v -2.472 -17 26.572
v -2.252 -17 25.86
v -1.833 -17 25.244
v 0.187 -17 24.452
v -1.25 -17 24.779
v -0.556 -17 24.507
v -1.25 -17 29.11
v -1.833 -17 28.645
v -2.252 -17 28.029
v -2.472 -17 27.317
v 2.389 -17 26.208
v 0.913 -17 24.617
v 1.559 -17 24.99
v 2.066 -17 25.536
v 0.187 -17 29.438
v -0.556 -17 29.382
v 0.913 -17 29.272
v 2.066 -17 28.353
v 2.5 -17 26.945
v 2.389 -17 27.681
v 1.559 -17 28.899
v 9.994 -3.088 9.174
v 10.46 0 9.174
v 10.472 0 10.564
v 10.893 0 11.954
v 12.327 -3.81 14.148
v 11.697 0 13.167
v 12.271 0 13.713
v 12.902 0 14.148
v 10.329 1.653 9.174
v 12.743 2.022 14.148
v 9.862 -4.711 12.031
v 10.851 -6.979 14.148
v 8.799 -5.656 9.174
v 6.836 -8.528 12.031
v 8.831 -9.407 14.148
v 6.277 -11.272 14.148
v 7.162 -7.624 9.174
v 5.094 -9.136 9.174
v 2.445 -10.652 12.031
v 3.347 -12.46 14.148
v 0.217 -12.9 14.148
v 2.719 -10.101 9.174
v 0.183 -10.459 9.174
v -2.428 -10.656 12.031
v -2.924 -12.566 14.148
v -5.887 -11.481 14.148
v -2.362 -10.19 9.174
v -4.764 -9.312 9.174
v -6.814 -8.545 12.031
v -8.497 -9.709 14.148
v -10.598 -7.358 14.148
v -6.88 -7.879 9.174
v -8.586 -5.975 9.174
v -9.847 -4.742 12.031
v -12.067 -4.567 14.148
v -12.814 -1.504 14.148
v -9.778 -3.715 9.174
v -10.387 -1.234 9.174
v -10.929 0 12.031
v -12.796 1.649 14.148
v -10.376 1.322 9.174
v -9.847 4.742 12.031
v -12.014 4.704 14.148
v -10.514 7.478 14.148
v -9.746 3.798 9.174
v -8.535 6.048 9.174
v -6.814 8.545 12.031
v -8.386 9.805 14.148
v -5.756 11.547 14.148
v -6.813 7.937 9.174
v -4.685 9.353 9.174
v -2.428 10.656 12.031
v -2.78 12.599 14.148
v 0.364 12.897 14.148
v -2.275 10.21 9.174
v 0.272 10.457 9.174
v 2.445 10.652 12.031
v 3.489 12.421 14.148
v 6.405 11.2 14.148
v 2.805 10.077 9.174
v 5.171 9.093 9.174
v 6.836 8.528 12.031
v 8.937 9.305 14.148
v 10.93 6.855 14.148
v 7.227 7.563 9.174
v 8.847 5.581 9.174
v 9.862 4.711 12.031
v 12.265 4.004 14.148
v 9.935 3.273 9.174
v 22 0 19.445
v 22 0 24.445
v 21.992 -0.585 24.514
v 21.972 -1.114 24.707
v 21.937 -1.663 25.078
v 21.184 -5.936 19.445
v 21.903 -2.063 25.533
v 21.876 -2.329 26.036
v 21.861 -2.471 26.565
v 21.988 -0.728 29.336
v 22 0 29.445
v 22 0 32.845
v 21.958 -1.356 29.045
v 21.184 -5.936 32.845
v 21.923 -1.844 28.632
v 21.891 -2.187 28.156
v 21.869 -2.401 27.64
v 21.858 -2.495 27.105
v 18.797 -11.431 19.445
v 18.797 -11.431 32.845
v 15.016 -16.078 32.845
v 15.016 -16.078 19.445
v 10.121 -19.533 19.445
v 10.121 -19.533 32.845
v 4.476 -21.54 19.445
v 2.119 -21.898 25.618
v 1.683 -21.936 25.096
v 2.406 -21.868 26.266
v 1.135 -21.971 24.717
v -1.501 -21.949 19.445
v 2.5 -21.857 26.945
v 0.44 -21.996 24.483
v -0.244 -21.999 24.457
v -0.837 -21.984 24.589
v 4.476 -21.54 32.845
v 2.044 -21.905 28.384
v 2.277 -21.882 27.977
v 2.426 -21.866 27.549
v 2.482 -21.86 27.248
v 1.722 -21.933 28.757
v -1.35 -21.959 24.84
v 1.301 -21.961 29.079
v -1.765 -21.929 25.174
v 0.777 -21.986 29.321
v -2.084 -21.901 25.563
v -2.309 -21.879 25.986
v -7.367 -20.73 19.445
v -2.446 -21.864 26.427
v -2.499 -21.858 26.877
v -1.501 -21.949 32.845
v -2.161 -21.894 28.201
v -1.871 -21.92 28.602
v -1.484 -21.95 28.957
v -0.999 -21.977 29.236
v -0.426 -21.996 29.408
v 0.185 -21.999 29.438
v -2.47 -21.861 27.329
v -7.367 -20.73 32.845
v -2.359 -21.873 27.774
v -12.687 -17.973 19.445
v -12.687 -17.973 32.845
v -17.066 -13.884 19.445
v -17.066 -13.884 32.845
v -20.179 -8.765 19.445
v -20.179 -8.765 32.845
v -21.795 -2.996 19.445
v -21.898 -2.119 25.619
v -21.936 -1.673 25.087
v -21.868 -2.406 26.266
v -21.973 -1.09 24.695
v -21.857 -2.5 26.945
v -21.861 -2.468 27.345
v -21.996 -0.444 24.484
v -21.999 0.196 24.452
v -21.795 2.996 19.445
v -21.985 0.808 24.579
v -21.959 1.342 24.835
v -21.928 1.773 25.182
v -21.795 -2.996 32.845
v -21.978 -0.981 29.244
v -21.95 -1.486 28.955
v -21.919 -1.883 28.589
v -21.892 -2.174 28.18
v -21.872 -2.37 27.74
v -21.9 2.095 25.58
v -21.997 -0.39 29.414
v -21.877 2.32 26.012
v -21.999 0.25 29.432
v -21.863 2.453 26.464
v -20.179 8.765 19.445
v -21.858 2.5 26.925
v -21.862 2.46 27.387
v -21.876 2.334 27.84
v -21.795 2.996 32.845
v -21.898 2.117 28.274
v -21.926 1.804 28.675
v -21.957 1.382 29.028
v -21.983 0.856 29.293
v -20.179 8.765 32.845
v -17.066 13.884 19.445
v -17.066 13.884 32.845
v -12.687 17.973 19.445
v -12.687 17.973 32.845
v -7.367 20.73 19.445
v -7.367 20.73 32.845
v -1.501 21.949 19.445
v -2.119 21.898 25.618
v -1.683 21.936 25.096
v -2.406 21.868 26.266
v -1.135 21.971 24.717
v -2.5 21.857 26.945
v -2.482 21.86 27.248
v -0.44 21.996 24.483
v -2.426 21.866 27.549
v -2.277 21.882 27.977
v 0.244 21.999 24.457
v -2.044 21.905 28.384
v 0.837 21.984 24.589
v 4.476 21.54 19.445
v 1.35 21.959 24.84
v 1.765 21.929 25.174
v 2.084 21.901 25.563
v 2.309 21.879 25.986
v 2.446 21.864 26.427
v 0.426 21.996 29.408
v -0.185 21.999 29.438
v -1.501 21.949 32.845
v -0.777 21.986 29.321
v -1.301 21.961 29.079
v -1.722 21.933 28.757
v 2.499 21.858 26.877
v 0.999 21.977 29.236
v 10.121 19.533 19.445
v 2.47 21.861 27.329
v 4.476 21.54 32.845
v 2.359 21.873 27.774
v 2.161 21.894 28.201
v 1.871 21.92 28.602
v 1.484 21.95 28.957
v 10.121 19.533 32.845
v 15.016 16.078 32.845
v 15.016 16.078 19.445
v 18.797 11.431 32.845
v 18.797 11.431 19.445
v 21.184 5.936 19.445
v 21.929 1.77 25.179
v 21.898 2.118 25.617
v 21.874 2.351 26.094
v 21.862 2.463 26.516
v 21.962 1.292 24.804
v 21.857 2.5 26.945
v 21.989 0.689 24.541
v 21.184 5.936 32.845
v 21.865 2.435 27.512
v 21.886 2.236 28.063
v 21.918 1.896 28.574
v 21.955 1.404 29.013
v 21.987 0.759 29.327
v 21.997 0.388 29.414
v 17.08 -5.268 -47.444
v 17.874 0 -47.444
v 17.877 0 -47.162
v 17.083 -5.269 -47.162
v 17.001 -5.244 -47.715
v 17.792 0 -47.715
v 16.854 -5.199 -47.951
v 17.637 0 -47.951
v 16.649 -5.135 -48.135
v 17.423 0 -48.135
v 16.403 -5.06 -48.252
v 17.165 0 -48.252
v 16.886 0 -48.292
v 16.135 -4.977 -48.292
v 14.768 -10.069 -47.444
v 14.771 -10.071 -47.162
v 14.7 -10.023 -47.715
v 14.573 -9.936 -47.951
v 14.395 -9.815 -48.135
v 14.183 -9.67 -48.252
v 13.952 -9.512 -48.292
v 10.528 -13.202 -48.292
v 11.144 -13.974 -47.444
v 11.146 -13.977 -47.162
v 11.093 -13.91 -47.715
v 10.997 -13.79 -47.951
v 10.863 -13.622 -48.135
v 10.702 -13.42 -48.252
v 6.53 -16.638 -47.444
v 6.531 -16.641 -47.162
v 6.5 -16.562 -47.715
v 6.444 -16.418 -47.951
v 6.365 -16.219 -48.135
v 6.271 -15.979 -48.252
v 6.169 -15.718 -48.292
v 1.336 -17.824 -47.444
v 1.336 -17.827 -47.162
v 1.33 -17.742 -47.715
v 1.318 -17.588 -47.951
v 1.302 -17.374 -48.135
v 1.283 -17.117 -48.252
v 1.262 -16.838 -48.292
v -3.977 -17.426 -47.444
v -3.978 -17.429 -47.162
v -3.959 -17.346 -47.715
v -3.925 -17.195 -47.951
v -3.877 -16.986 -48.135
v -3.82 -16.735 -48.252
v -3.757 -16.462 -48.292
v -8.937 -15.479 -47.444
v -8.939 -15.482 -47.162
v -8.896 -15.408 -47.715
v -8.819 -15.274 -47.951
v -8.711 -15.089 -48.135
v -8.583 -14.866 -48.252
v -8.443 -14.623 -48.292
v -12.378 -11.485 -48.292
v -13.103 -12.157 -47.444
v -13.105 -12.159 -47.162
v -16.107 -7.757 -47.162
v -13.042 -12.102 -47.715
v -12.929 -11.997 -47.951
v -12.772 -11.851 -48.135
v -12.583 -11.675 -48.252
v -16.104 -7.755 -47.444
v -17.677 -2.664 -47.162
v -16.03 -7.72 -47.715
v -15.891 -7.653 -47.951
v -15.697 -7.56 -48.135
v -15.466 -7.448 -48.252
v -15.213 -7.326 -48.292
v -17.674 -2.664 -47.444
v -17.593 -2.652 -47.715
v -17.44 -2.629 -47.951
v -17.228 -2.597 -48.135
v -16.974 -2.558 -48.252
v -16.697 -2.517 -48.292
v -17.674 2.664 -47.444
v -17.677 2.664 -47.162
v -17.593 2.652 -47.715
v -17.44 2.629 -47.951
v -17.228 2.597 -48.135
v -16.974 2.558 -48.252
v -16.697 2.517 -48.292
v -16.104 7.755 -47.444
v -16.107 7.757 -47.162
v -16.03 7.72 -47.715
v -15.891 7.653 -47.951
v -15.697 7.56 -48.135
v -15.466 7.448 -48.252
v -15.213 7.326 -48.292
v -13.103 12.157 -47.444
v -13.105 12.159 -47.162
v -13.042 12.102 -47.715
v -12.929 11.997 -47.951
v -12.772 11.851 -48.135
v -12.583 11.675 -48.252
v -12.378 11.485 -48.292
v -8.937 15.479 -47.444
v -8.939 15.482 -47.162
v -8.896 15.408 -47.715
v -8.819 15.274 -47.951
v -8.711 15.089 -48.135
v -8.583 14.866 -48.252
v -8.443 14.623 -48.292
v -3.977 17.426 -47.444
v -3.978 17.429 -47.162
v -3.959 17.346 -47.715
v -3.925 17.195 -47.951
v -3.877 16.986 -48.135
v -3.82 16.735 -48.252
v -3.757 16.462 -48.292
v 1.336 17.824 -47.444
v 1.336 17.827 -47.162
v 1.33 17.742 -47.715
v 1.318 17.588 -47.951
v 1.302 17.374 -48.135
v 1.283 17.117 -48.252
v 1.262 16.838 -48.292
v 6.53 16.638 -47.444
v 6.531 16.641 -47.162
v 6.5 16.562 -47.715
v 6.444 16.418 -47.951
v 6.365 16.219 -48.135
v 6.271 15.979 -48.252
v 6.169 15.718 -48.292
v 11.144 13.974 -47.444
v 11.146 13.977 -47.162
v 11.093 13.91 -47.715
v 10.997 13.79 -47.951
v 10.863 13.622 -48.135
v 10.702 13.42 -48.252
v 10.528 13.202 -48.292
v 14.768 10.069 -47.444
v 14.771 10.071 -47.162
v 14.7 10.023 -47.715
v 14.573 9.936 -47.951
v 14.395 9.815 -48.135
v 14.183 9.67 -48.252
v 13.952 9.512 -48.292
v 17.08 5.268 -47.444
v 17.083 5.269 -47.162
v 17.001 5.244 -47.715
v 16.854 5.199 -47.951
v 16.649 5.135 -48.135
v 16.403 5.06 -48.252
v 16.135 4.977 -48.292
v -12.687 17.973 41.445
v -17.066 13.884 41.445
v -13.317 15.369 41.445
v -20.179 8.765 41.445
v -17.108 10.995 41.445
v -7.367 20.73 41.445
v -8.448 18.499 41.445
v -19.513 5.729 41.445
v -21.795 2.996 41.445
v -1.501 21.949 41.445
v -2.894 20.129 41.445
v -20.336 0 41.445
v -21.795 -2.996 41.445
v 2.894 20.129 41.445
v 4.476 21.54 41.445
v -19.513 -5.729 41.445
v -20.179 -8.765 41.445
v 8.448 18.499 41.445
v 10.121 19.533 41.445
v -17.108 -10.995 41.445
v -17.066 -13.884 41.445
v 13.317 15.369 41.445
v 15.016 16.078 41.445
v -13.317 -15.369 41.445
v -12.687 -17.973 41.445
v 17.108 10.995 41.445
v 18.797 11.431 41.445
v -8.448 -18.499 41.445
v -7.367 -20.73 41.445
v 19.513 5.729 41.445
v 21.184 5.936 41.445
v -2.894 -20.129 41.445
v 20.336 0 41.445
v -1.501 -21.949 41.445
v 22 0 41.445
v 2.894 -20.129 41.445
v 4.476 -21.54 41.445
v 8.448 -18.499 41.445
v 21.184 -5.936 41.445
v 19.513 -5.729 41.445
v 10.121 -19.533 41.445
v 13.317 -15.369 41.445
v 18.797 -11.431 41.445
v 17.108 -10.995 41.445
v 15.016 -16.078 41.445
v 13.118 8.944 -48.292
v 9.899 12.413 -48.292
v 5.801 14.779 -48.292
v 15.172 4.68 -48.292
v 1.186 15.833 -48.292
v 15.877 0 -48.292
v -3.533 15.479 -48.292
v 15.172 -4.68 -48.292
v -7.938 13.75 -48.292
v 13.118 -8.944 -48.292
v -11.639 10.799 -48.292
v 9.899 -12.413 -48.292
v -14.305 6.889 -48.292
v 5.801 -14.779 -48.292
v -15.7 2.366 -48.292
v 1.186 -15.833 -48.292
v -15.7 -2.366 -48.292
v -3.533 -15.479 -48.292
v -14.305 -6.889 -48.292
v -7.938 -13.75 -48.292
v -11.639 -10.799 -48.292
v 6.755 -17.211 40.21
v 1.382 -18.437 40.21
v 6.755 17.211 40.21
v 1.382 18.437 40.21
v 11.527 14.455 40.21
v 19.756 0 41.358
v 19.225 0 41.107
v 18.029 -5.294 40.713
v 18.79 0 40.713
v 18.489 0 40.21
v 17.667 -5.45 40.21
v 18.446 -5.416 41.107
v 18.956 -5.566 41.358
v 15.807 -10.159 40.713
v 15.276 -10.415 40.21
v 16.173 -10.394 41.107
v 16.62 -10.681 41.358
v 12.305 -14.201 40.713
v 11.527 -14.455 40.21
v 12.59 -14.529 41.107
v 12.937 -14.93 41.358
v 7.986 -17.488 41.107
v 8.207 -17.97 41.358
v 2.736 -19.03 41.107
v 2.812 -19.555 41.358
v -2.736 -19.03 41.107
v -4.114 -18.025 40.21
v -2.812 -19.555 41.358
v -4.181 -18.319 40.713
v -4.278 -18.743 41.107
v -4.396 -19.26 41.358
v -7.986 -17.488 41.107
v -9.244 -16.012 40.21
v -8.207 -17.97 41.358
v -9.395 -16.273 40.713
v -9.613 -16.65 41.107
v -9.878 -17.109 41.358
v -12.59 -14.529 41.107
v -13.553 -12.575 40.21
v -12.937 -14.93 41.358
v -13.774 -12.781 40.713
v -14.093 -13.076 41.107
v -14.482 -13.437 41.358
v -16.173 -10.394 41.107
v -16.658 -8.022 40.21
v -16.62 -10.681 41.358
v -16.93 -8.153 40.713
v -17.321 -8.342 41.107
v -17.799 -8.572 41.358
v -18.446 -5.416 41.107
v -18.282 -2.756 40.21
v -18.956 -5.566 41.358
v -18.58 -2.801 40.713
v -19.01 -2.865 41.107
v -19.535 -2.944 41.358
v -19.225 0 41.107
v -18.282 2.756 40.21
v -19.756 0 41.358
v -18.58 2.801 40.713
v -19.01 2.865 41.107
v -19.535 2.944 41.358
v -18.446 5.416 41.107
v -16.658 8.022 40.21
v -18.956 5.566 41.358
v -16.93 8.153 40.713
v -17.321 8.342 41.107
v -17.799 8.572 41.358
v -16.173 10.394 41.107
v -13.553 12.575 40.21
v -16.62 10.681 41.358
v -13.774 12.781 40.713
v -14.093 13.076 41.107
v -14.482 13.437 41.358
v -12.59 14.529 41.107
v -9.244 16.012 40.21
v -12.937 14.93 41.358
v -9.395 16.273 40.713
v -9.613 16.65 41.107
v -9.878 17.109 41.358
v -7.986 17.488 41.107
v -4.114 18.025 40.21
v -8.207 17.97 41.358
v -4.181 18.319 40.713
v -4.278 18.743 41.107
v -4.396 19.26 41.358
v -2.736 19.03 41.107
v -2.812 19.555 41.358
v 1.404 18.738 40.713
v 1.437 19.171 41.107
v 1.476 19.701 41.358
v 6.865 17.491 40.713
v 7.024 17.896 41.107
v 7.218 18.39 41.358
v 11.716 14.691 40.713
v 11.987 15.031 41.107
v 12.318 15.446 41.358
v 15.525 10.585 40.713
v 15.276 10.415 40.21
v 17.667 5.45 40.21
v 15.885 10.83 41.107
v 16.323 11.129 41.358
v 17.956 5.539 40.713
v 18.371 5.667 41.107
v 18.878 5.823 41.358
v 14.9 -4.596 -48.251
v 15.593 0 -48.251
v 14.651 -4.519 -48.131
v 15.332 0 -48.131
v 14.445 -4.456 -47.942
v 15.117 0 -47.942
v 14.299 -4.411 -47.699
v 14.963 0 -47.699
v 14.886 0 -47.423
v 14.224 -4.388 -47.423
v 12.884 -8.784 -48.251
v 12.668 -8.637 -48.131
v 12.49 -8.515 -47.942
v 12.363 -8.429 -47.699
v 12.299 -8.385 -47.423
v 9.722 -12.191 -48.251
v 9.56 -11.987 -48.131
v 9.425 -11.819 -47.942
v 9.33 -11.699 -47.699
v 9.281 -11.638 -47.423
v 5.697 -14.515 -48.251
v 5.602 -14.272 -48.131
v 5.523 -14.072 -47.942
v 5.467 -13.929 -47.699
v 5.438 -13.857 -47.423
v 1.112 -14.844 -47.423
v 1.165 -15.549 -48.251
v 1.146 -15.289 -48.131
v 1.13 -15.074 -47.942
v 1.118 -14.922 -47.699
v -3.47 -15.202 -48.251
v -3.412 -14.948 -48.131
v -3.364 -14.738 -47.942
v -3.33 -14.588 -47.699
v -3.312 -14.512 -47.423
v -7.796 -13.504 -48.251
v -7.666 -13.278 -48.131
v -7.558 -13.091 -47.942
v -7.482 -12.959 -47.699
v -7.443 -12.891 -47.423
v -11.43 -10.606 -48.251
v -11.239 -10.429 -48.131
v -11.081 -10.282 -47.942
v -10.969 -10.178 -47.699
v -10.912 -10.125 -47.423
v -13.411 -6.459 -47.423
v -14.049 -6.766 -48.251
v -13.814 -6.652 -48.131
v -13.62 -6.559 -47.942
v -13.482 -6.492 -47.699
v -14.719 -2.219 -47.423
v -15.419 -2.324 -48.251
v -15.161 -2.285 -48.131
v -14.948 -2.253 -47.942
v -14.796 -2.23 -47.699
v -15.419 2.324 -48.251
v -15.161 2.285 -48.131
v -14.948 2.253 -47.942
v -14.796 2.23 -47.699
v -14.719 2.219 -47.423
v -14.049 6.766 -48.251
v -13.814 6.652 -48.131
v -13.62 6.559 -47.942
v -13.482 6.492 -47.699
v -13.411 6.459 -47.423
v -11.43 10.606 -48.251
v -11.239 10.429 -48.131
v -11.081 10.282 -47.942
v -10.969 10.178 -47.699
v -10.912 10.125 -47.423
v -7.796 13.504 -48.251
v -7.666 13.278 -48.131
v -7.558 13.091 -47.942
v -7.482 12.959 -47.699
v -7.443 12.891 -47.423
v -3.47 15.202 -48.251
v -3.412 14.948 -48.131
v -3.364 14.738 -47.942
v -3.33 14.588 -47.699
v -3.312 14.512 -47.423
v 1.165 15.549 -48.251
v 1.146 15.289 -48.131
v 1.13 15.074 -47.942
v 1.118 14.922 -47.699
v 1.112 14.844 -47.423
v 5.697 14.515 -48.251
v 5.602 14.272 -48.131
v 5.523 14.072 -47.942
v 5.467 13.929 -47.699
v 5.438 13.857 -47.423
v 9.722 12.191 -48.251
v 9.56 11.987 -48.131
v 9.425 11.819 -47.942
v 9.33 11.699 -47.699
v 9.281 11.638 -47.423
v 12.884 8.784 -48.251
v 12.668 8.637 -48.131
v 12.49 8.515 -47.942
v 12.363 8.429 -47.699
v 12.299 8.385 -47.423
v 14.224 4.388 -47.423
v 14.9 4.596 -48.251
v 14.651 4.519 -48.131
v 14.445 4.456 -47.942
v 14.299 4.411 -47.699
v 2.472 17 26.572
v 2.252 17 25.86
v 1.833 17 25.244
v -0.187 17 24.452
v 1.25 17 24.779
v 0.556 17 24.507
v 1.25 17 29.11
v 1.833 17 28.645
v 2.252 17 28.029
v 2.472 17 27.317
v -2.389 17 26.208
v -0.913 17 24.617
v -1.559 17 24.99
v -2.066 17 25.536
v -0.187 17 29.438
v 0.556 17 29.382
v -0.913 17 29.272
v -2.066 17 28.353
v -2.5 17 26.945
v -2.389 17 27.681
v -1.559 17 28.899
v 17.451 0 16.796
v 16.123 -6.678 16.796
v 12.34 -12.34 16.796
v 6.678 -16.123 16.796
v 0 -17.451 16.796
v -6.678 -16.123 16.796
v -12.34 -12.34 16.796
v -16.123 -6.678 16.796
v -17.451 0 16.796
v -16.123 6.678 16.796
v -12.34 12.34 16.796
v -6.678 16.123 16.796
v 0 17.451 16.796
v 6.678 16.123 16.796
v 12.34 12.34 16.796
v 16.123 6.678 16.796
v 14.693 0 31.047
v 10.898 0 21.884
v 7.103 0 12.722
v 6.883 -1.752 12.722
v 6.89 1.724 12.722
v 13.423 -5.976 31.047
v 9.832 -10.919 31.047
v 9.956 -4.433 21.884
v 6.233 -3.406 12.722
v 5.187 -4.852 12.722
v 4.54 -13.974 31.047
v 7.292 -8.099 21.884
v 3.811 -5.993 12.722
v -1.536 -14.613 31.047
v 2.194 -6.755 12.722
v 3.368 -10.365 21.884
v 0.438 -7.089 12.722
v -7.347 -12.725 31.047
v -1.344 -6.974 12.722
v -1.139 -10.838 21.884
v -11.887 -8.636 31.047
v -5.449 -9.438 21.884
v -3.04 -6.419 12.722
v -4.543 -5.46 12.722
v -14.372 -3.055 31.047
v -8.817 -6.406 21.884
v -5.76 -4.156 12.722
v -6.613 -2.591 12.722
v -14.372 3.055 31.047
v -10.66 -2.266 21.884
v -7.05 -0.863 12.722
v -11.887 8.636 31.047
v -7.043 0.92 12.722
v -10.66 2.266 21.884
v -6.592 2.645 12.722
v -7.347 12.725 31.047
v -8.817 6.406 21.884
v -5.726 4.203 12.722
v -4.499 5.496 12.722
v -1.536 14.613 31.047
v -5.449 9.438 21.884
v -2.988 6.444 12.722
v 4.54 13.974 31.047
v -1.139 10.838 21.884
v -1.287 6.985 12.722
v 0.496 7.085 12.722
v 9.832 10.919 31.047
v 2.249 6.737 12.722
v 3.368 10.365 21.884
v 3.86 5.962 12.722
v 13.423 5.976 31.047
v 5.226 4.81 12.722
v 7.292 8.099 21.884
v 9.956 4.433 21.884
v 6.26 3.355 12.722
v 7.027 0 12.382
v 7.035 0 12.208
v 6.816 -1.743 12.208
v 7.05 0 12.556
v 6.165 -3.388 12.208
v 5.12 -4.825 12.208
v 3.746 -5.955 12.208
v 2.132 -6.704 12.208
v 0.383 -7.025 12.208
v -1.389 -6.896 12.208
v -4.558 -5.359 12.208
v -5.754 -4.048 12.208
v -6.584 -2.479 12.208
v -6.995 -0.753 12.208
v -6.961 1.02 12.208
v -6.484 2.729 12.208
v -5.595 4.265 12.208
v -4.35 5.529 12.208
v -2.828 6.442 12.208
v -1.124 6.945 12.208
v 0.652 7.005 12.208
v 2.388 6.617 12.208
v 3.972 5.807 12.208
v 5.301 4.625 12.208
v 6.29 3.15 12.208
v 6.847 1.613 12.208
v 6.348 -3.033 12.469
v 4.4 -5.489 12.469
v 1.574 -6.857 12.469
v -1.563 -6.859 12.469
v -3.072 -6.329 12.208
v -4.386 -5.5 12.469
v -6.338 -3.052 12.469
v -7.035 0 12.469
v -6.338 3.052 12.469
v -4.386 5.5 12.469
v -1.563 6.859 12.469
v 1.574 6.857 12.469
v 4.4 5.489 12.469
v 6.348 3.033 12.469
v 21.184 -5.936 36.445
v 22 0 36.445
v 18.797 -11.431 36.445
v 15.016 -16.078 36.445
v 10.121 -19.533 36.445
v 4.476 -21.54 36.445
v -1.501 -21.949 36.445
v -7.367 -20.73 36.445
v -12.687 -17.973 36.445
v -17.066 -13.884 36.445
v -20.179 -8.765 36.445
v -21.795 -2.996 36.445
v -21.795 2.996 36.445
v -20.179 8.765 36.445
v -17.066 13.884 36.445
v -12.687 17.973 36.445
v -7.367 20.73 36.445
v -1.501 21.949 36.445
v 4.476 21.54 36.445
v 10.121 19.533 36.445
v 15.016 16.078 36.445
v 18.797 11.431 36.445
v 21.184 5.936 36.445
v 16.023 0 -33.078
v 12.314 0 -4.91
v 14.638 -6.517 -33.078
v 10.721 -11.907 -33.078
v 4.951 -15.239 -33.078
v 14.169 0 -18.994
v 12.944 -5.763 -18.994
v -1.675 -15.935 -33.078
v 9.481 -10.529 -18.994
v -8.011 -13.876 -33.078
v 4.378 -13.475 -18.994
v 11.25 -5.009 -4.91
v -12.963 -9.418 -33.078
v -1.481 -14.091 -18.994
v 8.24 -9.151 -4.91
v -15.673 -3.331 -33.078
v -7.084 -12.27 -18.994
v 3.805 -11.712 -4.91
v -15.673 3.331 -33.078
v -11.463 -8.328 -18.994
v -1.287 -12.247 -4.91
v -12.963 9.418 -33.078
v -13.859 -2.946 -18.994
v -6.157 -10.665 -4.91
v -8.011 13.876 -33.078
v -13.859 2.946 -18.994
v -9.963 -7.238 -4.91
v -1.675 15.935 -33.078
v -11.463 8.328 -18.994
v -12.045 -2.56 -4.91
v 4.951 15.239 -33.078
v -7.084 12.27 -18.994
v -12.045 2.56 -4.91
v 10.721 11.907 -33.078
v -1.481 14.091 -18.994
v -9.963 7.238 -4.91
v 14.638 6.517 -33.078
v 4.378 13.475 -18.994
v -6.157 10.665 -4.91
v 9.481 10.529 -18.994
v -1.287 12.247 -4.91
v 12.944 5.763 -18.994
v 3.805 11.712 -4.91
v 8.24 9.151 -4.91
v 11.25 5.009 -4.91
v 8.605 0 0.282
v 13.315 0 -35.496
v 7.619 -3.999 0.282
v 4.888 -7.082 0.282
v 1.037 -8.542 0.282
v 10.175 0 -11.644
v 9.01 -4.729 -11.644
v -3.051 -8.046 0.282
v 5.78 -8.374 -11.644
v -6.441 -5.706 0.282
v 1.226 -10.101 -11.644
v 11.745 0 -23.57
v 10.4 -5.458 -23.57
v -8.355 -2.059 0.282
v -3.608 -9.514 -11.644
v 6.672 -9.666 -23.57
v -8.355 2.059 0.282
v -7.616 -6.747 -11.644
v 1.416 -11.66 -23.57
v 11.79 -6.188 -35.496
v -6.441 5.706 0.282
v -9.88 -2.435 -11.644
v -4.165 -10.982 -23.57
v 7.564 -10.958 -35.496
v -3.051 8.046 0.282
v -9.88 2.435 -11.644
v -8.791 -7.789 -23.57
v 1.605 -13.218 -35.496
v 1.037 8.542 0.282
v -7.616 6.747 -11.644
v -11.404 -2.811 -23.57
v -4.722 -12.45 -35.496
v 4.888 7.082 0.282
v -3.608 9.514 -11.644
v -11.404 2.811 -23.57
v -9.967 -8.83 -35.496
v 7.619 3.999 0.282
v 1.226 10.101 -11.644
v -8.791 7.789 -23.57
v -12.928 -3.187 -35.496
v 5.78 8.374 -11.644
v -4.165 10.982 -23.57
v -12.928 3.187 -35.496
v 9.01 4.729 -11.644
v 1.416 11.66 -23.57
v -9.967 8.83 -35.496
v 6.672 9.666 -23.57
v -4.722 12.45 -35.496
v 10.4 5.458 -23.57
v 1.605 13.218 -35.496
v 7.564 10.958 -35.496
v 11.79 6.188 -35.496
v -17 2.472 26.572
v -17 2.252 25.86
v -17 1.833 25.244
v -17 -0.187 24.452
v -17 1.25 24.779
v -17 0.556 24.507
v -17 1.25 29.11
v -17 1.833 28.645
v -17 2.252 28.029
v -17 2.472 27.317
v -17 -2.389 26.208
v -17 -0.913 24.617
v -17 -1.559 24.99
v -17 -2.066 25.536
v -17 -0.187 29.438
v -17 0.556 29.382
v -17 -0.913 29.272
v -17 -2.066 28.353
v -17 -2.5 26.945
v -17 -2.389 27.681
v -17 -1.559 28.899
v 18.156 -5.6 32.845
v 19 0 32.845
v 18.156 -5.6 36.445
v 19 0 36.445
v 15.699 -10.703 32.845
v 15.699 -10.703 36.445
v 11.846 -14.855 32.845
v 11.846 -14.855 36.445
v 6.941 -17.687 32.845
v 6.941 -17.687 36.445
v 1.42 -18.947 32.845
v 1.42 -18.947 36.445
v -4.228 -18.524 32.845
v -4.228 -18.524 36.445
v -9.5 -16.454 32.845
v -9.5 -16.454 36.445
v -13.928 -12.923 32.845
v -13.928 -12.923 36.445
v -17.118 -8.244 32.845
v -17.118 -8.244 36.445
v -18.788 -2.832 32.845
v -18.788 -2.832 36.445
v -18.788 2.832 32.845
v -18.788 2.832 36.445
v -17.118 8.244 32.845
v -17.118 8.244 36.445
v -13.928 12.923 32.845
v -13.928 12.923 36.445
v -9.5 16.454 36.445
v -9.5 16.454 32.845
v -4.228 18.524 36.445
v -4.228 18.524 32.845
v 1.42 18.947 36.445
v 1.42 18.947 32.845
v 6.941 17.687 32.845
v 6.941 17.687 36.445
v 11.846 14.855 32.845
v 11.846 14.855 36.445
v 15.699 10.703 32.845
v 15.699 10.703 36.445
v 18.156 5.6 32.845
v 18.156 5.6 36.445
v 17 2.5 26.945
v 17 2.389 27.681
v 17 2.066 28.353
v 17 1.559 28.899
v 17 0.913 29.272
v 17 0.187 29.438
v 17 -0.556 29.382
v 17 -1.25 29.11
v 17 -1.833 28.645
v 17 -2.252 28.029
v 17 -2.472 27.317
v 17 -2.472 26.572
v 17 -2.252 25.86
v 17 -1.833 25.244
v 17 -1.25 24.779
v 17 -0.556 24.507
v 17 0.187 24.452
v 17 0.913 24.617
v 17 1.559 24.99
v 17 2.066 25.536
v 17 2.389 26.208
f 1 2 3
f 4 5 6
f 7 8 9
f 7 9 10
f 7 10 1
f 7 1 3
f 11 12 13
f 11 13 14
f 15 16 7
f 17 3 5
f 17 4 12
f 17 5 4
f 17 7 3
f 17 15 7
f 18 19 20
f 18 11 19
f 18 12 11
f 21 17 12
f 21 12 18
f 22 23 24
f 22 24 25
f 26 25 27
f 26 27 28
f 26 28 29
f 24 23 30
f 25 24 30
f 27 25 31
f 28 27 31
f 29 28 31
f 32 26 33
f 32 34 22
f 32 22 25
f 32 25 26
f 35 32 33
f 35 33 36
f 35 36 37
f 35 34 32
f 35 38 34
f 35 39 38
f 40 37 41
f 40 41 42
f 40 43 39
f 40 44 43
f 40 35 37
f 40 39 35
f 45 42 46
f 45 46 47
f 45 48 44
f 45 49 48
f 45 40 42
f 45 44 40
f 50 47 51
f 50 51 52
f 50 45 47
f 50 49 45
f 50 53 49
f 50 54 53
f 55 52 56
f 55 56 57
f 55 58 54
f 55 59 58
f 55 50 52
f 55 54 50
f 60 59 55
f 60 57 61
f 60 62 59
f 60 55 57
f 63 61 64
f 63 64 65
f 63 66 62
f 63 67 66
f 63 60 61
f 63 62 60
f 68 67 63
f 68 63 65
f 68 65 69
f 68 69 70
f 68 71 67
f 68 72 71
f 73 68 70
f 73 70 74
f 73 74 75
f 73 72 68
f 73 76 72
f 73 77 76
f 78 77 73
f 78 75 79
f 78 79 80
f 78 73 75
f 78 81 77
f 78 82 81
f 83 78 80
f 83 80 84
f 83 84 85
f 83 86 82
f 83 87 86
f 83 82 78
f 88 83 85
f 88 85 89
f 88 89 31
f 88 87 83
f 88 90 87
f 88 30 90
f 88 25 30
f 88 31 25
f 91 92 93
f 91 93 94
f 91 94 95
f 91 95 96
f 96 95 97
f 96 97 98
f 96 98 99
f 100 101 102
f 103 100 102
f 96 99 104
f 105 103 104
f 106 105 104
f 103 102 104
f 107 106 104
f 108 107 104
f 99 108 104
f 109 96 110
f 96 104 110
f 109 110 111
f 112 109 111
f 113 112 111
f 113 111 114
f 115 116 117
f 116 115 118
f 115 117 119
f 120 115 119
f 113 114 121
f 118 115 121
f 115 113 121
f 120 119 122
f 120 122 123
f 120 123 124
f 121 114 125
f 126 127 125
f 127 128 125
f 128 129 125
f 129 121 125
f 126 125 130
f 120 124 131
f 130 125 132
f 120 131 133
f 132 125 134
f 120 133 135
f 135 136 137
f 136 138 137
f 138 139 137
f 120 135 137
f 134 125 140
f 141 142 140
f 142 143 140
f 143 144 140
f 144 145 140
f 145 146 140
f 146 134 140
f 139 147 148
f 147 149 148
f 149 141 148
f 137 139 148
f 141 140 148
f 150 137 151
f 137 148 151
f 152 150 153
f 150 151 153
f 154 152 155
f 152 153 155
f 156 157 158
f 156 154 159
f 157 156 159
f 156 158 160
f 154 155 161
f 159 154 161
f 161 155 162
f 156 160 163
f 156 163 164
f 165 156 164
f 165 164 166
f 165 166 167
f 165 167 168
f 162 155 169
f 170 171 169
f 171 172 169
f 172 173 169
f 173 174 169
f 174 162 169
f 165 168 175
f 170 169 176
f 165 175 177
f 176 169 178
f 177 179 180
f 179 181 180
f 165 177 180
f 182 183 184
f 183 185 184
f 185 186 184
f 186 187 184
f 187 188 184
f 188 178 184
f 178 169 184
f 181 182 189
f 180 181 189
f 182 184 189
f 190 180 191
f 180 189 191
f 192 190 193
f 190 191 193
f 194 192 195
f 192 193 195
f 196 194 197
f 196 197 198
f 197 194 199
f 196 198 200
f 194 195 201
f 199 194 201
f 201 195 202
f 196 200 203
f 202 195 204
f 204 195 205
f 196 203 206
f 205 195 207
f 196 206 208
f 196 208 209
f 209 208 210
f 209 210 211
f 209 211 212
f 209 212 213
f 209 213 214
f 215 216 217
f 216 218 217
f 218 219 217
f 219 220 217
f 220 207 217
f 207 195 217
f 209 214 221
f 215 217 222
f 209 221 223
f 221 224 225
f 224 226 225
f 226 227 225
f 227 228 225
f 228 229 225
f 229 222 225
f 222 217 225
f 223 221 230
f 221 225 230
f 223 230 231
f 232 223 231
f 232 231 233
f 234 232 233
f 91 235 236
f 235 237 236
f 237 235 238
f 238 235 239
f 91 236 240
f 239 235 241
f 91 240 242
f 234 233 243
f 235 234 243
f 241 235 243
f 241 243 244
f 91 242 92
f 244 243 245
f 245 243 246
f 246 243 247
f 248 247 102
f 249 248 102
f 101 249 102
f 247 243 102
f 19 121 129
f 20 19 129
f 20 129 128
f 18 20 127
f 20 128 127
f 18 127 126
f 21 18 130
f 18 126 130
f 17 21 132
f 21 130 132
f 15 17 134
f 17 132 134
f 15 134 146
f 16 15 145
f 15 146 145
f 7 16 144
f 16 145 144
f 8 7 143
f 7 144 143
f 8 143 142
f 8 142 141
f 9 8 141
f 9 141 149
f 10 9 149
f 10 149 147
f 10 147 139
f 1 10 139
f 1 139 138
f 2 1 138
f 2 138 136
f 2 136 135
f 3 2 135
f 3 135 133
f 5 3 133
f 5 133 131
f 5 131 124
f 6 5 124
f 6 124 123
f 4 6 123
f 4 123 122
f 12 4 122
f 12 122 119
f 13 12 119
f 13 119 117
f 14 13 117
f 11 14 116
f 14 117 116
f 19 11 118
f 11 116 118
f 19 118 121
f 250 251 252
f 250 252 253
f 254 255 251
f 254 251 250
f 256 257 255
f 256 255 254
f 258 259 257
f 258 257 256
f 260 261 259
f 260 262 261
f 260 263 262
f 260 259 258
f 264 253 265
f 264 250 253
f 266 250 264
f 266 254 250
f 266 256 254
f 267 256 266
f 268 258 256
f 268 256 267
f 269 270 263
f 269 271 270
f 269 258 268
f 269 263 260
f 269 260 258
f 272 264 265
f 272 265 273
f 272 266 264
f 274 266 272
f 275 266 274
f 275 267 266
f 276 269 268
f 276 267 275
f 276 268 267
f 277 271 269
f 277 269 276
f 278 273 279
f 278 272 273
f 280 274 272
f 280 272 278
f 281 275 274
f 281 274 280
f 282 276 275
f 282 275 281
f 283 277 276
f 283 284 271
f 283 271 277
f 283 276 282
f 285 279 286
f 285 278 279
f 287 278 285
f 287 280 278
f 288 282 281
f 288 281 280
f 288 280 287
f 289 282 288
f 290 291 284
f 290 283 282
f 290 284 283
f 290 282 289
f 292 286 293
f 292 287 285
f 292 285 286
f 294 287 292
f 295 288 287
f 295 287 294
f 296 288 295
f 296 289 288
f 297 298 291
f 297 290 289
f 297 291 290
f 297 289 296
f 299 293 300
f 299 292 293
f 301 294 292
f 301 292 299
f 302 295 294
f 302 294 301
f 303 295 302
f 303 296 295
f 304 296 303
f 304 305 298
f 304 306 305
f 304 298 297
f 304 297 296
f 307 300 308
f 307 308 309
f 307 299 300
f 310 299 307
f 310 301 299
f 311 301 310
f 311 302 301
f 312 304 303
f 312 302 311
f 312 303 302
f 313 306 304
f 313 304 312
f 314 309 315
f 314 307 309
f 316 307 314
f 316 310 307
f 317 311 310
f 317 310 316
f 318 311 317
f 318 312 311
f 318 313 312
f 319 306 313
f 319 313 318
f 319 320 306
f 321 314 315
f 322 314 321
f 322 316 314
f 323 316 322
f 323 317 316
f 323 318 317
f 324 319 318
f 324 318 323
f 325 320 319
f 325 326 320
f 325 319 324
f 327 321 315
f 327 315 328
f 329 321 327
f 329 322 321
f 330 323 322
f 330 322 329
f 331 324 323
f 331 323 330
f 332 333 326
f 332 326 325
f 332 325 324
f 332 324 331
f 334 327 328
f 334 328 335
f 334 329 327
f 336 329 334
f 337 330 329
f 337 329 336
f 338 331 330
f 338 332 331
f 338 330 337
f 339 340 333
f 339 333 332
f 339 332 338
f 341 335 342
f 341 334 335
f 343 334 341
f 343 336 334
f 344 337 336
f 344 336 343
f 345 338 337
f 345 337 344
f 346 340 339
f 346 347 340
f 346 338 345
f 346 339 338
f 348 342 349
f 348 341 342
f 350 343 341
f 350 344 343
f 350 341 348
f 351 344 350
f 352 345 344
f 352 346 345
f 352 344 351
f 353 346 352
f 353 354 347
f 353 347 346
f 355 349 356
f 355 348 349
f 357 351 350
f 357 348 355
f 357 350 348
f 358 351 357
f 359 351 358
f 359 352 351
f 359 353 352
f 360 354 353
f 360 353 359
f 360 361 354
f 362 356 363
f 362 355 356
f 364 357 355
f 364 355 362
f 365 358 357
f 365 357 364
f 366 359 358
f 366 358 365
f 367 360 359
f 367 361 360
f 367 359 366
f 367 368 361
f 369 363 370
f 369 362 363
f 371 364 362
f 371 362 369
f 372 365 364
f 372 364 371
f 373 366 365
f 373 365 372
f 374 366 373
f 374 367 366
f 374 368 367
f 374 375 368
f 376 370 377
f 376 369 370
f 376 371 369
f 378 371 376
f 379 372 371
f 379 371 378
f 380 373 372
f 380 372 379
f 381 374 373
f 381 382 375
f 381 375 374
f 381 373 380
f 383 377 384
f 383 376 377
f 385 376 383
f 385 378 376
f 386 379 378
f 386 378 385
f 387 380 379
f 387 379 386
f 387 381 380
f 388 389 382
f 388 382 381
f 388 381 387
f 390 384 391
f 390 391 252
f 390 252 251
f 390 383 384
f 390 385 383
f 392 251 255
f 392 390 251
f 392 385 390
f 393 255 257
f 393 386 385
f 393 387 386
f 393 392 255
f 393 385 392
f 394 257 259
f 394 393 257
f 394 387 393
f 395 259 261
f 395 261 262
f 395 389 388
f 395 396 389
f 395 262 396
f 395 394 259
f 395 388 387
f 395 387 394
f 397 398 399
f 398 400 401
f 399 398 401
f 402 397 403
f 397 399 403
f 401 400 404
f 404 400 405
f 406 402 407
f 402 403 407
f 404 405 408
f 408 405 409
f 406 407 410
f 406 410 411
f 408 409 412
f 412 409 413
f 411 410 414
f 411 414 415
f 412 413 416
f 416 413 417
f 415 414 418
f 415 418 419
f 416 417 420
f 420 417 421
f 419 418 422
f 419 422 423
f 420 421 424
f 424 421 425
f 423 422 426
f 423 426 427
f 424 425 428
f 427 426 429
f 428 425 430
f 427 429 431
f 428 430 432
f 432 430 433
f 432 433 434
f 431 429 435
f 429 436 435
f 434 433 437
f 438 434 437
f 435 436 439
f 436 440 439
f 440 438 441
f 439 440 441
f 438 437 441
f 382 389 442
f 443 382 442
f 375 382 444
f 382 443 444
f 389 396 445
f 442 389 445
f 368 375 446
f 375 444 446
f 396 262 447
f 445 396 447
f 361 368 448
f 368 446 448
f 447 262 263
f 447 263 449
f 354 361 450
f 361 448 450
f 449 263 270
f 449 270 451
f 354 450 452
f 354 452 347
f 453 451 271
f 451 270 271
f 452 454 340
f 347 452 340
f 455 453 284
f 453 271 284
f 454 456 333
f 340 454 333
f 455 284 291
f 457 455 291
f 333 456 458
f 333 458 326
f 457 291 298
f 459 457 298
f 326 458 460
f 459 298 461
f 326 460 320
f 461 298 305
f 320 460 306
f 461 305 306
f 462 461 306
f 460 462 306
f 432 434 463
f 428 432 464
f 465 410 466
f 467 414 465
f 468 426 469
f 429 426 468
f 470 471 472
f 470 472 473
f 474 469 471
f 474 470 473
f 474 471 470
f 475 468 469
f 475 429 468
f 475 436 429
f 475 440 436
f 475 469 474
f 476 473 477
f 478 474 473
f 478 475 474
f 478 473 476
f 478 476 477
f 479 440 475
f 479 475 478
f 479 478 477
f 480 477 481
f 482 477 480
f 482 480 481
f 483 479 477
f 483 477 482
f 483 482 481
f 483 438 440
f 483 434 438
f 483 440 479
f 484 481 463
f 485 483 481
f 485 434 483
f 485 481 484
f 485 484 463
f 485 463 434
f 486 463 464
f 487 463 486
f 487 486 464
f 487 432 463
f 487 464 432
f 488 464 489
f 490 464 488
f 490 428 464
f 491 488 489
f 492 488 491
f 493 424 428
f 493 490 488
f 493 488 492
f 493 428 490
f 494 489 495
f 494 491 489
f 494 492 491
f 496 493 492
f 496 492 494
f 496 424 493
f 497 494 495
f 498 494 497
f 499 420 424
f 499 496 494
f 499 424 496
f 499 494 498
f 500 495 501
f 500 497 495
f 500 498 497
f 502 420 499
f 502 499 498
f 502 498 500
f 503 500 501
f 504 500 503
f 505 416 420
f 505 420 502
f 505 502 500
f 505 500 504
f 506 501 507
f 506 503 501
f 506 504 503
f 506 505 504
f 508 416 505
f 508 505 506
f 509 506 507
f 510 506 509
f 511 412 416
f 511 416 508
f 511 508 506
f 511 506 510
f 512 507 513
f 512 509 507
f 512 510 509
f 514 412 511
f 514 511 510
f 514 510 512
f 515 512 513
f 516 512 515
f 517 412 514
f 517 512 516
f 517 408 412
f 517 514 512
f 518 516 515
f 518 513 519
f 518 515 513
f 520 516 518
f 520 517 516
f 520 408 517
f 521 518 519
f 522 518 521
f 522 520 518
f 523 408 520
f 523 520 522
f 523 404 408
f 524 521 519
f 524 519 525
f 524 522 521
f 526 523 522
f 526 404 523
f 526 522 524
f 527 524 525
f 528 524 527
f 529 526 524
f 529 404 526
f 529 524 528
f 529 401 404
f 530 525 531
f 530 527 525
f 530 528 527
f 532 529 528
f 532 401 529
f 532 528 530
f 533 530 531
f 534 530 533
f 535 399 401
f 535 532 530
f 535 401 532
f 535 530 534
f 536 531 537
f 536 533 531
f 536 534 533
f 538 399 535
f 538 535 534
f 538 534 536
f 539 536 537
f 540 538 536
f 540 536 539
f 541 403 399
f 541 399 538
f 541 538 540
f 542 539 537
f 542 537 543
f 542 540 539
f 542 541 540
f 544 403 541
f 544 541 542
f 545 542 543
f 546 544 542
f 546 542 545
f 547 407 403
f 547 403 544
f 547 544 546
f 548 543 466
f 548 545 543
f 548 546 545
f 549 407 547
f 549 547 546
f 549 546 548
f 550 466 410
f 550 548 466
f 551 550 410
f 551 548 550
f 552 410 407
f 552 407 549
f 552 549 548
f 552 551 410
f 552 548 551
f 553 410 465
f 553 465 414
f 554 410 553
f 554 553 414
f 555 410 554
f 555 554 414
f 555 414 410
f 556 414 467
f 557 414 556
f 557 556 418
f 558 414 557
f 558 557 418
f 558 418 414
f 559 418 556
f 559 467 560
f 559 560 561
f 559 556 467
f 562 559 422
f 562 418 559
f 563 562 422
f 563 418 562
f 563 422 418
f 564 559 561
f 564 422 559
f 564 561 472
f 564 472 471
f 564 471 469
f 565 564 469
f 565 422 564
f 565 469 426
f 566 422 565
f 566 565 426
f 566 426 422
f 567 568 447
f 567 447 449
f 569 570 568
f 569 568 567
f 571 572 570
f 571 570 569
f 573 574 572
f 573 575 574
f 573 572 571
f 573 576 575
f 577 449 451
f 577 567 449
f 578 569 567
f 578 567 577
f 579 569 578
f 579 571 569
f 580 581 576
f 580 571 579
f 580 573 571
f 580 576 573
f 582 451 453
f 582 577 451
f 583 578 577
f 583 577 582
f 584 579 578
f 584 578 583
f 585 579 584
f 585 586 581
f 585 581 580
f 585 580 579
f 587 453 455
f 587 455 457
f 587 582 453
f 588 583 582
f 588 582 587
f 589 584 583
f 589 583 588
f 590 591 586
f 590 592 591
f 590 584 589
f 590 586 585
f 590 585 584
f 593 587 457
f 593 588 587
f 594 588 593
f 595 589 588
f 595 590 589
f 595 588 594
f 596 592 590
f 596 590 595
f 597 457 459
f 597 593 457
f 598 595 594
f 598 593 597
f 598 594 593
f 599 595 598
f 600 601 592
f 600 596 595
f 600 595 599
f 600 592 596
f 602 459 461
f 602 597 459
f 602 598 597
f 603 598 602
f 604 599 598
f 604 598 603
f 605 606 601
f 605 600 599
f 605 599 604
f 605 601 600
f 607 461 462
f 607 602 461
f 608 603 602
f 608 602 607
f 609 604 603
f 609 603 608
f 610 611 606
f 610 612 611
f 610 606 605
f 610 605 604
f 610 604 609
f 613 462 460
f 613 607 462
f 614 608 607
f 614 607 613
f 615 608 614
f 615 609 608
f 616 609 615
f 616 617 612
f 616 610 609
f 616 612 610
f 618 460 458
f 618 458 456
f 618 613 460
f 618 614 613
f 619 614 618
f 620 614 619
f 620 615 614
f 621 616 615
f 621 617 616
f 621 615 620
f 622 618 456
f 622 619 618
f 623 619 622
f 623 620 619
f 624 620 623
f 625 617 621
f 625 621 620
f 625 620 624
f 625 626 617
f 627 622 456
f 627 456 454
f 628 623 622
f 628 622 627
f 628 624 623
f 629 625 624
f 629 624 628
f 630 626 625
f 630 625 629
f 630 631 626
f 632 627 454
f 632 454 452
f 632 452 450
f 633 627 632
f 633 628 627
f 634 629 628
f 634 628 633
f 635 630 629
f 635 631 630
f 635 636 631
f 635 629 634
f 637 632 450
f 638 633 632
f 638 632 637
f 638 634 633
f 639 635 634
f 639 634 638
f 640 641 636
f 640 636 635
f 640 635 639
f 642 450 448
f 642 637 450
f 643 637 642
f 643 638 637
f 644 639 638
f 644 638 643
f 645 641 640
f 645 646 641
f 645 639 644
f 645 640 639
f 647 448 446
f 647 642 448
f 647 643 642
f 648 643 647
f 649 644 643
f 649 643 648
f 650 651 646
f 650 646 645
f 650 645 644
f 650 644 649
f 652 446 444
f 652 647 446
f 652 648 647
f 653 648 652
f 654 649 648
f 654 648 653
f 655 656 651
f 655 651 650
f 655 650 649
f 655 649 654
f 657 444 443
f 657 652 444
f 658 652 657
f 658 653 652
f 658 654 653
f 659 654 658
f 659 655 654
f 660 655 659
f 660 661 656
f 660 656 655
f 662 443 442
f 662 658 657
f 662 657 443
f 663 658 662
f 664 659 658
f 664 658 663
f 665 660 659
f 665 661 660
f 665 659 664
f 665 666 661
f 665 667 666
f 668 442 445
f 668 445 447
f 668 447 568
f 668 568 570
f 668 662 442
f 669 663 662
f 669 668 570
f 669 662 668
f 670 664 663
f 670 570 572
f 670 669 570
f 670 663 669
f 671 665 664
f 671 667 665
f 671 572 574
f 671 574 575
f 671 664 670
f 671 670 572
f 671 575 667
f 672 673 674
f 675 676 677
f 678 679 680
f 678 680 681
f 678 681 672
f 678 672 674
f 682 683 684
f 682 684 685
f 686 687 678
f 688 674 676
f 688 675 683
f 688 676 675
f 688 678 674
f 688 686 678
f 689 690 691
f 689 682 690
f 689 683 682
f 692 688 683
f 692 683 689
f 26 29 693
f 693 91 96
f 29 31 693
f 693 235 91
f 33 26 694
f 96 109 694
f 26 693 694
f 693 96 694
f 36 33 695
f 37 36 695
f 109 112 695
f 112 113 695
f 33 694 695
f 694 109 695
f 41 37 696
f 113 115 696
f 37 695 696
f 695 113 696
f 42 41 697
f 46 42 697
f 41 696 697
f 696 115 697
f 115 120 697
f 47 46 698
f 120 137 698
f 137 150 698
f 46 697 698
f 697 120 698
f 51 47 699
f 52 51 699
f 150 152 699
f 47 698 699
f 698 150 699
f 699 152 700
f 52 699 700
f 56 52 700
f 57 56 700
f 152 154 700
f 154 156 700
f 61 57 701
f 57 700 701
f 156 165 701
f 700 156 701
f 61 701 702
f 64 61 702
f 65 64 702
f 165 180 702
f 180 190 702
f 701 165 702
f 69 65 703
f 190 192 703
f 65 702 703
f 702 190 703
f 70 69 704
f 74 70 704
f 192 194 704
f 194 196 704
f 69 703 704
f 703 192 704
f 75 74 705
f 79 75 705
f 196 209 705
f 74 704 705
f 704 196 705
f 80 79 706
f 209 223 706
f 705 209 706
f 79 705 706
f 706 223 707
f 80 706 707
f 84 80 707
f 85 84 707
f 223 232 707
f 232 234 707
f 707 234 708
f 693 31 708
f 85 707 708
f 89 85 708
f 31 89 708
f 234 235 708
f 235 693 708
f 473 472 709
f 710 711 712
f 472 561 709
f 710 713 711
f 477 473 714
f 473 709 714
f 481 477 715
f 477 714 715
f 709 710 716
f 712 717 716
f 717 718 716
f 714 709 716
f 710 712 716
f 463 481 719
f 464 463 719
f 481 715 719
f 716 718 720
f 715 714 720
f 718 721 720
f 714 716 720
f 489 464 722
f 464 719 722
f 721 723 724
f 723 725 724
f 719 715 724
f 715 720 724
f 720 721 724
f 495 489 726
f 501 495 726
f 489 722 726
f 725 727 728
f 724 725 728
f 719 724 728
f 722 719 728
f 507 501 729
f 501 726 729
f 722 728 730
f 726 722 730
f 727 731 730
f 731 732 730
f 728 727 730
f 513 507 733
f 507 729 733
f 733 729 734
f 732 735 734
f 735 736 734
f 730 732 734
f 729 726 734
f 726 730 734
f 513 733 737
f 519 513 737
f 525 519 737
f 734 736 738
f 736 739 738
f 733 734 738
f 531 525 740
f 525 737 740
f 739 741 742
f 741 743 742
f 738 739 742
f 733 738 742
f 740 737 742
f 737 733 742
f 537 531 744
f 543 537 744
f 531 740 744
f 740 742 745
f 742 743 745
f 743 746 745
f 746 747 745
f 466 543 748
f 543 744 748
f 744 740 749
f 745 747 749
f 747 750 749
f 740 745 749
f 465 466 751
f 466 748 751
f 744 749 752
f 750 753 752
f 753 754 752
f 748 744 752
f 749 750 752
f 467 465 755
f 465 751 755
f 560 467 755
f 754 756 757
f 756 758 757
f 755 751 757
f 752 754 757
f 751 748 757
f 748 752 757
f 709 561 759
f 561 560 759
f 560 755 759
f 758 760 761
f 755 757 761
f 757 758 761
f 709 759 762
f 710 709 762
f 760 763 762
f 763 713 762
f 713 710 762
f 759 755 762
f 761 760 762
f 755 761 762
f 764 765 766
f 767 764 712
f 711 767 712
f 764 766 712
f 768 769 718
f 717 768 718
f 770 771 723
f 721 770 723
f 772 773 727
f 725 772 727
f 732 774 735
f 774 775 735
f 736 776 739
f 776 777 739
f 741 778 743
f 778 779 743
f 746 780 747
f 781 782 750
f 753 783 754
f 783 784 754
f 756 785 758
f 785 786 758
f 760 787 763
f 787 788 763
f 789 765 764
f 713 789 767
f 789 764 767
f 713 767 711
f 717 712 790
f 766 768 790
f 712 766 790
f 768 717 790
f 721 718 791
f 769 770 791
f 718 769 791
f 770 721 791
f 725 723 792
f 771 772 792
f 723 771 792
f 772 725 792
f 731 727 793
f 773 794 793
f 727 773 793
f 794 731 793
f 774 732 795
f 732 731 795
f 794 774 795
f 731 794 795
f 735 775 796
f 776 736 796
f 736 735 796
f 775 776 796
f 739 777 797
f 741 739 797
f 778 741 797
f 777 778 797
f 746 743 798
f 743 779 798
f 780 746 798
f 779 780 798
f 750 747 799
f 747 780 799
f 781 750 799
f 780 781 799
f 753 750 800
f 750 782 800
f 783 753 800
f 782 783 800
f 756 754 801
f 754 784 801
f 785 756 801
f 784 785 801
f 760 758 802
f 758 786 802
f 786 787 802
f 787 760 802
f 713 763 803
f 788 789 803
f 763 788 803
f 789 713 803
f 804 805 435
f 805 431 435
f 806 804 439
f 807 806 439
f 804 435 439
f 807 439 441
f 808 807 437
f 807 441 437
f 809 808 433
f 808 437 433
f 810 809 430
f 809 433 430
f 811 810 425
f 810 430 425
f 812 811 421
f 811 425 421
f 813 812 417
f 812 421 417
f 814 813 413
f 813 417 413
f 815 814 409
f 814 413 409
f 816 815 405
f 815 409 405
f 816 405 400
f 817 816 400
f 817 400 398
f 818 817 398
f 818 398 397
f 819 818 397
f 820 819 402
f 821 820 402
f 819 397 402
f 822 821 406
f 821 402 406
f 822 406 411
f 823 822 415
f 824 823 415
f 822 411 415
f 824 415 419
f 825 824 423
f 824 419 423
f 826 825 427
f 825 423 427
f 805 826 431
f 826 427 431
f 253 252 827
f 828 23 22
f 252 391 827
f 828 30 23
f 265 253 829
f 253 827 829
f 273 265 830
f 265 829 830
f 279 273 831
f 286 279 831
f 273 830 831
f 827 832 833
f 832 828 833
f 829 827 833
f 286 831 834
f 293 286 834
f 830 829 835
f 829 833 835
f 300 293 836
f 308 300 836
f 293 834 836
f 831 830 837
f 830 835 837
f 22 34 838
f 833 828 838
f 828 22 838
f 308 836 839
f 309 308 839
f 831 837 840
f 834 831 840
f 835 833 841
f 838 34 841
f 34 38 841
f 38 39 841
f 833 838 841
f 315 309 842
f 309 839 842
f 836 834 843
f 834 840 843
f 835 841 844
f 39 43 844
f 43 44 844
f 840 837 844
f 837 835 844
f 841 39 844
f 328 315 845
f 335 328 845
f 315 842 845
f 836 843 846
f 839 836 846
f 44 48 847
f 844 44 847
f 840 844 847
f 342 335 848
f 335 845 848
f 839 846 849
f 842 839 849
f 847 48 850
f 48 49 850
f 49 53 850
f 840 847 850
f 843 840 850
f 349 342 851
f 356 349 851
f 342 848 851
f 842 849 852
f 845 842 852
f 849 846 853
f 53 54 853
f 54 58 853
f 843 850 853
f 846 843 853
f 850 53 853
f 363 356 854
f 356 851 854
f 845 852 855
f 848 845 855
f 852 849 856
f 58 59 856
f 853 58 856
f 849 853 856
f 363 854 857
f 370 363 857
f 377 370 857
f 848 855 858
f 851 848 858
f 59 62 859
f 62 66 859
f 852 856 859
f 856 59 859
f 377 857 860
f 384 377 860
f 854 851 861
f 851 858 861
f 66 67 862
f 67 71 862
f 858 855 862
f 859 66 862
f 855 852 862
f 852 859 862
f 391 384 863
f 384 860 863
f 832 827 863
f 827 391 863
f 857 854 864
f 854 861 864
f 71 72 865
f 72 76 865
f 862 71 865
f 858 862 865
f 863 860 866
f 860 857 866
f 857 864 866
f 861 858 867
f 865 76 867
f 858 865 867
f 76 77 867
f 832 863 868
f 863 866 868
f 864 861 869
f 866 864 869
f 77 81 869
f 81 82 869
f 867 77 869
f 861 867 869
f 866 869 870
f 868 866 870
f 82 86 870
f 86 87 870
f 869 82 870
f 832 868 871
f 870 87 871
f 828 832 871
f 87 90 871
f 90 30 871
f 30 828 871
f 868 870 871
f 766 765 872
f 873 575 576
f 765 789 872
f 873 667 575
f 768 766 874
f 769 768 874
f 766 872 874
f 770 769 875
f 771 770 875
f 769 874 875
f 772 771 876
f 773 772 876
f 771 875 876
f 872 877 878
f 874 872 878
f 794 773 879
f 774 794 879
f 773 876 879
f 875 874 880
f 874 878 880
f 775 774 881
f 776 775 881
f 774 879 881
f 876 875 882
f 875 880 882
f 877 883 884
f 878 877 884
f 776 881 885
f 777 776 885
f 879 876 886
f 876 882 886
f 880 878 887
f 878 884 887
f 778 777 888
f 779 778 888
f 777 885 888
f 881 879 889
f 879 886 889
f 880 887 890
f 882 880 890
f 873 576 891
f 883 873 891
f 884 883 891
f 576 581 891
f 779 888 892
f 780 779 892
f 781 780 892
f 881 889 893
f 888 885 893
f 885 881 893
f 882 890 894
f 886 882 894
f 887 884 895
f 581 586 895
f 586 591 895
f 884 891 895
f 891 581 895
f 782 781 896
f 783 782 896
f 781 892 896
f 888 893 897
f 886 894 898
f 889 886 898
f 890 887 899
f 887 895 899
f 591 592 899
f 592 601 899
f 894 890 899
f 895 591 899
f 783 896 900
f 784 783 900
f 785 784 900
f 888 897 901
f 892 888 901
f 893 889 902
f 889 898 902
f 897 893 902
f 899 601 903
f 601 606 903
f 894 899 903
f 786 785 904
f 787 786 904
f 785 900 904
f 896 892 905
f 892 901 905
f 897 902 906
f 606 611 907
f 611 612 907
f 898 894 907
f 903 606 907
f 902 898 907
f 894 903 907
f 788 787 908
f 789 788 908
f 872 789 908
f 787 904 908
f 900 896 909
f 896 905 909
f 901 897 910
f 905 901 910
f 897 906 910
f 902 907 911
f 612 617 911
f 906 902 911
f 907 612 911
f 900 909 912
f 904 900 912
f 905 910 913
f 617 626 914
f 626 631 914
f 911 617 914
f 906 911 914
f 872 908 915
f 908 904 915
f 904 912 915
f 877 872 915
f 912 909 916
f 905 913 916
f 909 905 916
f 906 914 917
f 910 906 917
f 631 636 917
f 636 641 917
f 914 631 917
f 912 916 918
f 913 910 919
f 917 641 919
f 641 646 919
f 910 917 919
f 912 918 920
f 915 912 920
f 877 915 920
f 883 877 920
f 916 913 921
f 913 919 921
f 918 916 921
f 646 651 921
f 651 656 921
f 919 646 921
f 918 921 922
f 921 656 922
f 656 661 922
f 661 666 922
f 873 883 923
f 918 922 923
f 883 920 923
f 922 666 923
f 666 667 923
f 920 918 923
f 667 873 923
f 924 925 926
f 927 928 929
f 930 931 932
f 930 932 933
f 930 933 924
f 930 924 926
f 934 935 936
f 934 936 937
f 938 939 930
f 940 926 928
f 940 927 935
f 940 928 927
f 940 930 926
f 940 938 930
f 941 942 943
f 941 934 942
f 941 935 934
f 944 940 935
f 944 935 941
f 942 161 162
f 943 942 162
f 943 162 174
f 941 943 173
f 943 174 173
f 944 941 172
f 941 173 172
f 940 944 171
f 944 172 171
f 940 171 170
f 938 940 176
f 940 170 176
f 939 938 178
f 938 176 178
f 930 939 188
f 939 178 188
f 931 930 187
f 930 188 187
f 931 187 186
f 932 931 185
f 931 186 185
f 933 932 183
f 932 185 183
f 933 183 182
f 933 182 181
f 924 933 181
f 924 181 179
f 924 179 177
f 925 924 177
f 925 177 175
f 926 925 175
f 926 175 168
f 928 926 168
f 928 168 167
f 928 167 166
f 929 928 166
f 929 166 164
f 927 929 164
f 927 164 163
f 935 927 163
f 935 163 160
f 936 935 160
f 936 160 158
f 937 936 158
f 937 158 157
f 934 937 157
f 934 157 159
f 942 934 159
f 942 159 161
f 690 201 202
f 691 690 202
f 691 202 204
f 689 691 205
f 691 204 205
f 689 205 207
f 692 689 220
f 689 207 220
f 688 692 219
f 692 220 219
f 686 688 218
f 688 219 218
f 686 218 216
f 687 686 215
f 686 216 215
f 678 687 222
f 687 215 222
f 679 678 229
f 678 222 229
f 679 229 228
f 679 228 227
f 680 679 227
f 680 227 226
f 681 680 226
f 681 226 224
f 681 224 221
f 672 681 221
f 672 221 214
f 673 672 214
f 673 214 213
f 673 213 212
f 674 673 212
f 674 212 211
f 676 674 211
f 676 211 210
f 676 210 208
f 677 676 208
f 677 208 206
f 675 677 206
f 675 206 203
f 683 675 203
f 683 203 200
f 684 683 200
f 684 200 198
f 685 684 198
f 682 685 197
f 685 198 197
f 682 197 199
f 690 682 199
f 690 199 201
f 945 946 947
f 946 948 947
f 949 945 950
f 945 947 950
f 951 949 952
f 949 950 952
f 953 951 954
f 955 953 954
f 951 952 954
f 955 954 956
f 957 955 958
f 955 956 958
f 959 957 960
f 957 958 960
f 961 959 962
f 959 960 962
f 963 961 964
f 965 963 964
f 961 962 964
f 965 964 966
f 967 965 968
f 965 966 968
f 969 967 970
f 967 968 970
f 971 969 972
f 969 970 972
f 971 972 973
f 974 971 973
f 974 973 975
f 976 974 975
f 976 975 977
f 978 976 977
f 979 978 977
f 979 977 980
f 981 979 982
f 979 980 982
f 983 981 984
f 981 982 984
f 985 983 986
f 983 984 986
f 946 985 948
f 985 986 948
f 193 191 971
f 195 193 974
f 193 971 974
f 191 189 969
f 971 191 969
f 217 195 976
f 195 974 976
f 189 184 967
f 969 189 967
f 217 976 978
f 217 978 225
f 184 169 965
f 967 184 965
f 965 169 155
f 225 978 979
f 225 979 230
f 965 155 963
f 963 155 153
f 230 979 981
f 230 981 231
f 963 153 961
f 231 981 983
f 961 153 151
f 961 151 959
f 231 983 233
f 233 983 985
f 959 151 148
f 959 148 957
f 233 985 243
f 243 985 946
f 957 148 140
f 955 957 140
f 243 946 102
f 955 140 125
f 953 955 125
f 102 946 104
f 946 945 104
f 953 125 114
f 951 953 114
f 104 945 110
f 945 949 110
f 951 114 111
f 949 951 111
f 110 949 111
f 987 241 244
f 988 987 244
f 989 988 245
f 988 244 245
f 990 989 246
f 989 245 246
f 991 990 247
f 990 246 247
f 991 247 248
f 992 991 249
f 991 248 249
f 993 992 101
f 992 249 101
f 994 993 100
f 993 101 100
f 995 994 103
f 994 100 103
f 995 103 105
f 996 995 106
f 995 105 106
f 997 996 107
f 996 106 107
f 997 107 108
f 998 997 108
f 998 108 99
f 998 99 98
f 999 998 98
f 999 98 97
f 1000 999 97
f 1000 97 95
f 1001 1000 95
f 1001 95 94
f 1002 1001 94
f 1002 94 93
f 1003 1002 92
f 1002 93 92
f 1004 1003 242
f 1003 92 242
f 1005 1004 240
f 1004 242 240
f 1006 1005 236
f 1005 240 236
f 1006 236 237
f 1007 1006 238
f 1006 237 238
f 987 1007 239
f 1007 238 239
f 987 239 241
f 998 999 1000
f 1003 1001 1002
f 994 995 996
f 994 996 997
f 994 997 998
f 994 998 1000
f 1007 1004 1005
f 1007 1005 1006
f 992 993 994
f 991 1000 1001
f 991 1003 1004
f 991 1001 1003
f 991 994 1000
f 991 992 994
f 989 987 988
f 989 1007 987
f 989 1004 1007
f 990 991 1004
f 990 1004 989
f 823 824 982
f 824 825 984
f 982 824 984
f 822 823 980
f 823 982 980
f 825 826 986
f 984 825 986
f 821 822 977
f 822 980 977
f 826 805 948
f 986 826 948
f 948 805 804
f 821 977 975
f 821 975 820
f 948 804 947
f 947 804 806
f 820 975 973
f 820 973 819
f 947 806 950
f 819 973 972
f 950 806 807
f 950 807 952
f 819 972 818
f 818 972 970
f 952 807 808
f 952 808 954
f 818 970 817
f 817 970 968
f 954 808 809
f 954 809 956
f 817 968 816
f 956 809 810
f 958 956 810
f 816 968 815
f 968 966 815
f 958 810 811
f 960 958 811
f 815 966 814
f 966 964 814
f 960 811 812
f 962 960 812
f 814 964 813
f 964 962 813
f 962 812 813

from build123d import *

# Parameters (mm, degrees)
FILETE5_R             = 1
ESBO_O2_R             = 2.5
CORTE_EXTRUS_O1_DEPTH = 5
PADR_OCIRCULAR1_COUNT = 4
FILETE6_R             = 5
FILETE7_R             = 1
FILETE8_R             = 2


with BuildPart() as part:
    # Esboço1 → Revolução1 (revolve)
    with BuildSketch(Plane(origin=(0, 0, 0), x_dir=(1, 0, 0), z_dir=(0, 1, 0))):
        Polygon((-7, -12.473975434), (-15, 48.292057468), (-18.025886882, 48.292057468), (-10.025886882, -12.473975434), (-22, -19.444538182), (-22, -32.844538182), (-19, -32.844538182), (-19, -36.444538182), (-22, -36.444538182), (-22, -41.444538182), (-19, -41.444538182), align=None)
    revolve(axis=Axis((0, 0, 0), (0, 0, -1)))

    # Filete5
    filete5_edges = [part.edges().sort_by_distance(p)[0] for p in [
        (7, 0, 12.473975434),
    ]]
    fillet(filete5_edges, radius=FILETE5_R)

    # Esboço2 → Corte-extrusão1 (cut)
    with BuildSketch(Plane.ZX.offset(22)):
        with Locations((26.944538182, 0)):
            Circle(ESBO_O2_R)
    corte_extrus_o1 = extrude(amount=-CORTE_EXTRUS_O1_DEPTH, mode=Mode.SUBTRACT)

    # PadrãoCircular1: Corte-extrusão1 ×4 about axis
    padr_ocircular1_axis = Axis((0, 0, 41.444538182), (0, 0, 1))
    for i in range(1, PADR_OCIRCULAR1_COUNT):
        add(corte_extrus_o1.rotate(padr_ocircular1_axis, i * 360 / PADR_OCIRCULAR1_COUNT), mode=Mode.SUBTRACT)

    # Filete6
    filete6_edges = [part.edges().sort_by_distance(p)[0] for p in [
        (10.025886882, 0, 12.473975434),
    ]]
    fillet(filete6_edges, radius=FILETE6_R)

    # Filete7
    filete7_edges = [part.edges().sort_by_distance(p)[0] for p in [
        (15, 0, -48.292057468),
        (18.025886882, 0, -48.292057468),
    ]]
    fillet(filete7_edges, radius=FILETE7_R)

    # Filete8
    filete8_edges = [part.edges().sort_by_distance(p)[0] for p in [
        (19, 0, 41.444538182),
    ]]
    fillet(filete8_edges, radius=FILETE8_R)


solid = part.part
